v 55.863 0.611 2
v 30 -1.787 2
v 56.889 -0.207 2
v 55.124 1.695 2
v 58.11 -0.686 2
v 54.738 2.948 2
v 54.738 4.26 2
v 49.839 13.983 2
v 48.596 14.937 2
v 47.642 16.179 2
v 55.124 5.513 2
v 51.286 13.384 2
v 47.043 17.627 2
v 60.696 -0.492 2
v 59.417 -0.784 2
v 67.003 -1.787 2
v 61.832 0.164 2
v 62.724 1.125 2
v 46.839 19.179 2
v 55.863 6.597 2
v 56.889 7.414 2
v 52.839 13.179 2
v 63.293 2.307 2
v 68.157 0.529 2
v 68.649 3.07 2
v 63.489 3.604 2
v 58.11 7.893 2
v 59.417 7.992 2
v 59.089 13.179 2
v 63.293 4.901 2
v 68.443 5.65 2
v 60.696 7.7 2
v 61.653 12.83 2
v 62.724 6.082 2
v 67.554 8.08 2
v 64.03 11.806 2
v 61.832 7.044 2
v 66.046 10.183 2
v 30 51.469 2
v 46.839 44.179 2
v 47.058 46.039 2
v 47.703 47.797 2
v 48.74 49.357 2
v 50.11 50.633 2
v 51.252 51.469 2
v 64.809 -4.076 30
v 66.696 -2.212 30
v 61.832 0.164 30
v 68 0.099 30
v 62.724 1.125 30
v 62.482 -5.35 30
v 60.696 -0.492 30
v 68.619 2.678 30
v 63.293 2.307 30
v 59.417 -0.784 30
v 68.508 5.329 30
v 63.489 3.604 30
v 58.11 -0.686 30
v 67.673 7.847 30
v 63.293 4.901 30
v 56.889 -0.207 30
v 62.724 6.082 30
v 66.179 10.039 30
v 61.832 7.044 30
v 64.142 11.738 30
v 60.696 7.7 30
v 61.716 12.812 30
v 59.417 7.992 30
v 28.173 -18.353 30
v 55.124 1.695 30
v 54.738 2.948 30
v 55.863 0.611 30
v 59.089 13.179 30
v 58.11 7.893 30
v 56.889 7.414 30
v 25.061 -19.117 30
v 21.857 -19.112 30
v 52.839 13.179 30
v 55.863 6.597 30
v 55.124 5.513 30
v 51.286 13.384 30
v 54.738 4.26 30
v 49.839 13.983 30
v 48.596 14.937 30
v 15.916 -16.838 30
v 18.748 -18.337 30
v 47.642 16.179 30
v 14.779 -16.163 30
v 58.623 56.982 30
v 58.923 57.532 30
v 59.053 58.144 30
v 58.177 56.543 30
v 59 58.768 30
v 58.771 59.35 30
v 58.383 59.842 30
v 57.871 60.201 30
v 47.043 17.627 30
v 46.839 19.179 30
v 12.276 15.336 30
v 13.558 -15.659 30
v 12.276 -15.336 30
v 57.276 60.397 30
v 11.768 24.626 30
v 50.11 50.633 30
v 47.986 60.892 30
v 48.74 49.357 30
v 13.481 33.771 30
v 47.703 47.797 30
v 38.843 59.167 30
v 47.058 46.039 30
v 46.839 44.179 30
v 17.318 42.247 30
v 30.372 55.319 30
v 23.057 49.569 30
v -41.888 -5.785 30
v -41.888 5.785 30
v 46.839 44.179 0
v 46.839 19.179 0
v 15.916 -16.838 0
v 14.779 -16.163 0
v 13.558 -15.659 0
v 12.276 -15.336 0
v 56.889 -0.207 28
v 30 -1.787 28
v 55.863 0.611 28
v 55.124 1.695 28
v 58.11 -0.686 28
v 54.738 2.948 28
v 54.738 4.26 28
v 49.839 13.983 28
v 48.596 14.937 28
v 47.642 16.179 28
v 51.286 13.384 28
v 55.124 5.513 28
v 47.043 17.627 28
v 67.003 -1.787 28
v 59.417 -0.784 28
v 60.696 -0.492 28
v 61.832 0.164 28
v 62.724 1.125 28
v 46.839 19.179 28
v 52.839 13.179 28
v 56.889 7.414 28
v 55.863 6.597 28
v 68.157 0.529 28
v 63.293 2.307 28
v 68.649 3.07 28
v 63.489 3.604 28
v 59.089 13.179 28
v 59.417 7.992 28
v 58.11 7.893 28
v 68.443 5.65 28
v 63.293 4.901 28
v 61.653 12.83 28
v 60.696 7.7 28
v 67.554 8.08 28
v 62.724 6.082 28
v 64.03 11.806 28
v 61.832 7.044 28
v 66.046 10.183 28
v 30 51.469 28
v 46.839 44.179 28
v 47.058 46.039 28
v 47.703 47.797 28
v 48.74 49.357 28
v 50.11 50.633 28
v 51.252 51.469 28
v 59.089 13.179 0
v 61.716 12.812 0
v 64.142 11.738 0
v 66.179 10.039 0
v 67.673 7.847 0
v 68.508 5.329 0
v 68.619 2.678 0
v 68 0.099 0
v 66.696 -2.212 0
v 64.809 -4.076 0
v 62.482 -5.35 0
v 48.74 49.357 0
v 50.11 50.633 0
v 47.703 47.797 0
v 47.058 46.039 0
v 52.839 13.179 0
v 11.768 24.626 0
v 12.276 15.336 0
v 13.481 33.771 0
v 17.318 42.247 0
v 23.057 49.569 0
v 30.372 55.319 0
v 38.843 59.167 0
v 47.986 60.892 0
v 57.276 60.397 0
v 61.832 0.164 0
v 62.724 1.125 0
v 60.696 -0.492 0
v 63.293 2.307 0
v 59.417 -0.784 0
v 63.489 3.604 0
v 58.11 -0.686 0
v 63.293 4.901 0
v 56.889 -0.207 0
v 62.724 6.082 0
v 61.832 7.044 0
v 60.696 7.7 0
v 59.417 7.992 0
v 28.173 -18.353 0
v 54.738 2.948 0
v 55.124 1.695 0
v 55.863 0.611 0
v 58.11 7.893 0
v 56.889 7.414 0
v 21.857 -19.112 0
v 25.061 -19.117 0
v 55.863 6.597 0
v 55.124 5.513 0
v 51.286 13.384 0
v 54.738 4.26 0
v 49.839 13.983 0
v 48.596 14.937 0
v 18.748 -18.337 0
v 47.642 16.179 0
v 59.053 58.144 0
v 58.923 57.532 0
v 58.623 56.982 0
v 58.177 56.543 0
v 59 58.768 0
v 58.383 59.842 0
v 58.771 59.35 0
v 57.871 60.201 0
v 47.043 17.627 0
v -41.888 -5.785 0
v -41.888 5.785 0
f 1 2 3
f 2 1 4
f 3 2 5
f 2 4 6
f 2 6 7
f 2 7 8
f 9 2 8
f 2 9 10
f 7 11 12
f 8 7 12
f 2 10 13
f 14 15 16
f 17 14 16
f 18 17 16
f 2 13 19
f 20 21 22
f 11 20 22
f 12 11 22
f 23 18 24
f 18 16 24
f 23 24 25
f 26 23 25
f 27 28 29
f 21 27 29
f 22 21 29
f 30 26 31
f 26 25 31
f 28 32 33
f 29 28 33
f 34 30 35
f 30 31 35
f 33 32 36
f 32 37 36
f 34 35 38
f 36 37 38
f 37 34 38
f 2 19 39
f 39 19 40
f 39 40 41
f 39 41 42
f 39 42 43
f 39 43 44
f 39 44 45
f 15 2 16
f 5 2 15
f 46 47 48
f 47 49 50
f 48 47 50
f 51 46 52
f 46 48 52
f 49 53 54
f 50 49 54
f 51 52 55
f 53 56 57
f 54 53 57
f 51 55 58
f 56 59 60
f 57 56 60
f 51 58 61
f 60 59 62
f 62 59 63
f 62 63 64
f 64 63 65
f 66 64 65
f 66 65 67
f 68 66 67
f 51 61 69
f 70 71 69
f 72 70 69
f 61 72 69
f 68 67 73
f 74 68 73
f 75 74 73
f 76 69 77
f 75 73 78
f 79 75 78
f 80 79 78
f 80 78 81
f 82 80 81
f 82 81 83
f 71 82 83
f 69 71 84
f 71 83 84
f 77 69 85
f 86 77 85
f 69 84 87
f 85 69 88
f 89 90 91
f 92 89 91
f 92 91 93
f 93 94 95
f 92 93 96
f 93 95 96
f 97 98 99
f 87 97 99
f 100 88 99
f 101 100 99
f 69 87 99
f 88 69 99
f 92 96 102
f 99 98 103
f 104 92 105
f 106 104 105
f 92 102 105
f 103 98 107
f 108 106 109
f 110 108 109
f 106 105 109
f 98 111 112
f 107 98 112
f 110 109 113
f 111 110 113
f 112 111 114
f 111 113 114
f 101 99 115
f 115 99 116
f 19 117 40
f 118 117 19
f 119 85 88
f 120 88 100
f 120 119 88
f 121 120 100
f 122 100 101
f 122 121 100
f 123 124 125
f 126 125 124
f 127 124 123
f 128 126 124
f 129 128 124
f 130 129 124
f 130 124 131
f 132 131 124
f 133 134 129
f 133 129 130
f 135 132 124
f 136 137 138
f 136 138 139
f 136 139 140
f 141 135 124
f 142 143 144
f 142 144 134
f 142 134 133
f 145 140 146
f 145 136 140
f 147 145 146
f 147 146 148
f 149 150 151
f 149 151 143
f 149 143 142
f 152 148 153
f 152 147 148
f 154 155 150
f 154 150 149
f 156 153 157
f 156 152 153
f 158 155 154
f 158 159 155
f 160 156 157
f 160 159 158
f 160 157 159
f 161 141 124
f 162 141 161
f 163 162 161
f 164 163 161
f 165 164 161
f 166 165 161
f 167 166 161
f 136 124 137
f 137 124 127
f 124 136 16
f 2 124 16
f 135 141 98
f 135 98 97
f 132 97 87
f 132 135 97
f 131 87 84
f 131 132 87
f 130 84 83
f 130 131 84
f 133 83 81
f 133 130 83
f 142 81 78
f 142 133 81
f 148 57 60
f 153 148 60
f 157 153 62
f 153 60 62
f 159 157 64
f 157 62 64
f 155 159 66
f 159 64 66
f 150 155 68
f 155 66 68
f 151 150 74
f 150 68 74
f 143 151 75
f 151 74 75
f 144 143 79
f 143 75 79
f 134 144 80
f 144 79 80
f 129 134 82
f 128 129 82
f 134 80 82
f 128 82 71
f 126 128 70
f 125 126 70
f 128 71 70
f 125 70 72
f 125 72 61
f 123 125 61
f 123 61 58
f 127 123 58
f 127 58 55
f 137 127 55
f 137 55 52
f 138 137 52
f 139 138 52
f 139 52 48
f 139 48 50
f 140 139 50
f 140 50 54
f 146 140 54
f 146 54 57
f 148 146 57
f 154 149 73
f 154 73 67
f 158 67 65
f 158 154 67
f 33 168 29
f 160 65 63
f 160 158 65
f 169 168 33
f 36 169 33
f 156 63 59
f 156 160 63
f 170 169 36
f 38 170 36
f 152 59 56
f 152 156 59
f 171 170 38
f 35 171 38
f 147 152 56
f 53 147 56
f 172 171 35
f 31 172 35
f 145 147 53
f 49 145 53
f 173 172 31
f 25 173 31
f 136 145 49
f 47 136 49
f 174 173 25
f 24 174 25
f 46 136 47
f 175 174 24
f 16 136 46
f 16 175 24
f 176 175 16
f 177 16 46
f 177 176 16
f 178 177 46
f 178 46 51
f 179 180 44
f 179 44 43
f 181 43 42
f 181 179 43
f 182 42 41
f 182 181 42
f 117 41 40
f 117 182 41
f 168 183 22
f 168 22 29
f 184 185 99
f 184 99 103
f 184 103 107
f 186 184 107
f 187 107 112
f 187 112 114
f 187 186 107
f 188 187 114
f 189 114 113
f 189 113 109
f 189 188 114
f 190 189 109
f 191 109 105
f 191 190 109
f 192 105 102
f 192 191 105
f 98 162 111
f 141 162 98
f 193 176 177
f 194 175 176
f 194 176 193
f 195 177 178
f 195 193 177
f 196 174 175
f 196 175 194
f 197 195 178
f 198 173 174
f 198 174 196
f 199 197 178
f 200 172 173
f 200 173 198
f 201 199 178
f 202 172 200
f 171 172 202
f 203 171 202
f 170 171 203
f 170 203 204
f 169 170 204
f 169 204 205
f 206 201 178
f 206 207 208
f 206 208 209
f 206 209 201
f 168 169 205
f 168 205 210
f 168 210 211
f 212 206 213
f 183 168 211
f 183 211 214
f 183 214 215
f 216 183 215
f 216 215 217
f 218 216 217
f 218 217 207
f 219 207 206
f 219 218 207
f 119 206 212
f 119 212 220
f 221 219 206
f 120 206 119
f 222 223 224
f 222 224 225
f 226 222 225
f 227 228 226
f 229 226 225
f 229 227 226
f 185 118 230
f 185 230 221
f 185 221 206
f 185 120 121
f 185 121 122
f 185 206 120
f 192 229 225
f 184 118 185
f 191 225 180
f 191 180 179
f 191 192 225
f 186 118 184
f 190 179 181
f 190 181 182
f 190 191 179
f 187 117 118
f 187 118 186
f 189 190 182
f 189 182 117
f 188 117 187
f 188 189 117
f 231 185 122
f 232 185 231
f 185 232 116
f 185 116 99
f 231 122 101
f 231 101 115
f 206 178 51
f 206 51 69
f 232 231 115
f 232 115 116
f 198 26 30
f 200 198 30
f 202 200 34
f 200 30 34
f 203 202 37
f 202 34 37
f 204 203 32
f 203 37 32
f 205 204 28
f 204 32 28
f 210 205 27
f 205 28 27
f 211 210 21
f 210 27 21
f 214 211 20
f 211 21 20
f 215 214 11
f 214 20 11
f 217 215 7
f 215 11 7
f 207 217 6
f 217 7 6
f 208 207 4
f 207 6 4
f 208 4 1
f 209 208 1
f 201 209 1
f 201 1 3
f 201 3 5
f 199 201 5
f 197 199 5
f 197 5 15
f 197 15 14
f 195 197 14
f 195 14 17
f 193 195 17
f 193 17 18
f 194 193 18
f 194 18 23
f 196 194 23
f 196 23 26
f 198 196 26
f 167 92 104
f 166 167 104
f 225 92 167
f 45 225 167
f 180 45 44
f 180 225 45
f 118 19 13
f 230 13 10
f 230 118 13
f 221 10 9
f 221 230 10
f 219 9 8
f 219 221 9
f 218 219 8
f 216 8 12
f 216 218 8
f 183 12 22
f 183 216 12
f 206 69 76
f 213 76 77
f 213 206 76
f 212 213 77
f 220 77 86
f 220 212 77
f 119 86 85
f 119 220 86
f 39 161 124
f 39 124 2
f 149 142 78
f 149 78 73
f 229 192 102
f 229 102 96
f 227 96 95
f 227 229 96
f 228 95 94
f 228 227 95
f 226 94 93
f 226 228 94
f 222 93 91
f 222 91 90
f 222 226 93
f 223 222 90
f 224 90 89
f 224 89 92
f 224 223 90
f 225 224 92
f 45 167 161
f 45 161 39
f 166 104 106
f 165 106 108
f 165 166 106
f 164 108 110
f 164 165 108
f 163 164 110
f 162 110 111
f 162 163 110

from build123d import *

# Parameters (mm, degrees)
BOSS_EXTRUDE1_DEPTH = 30
SKETCH2_R           = 4.4
CUT_EXTRUDE1_DEPTH  = 97.608495293
SKETCH4_W           = 26
SKETCH4_H           = 53.255509589
CUT_EXTRUDE2_DEPTH  = 40


with BuildPart() as part:
    # Sketch1 → Boss-Extrude1 (new body)
    with BuildSketch(Plane.XY):
        with BuildLine():
            Line((-41.88810428, 5.785), (12.276322135, 15.335649772))
            ThreePointArc((12.276322135, 15.335649772), (23.057327156, 49.569411506), (57.276322135, 60.397194952))
            ThreePointArc((57.276322135, 60.397194952), (59.00041024, 58.767721176), (58.177057872, 56.542916587))
            Line((58.177057872, 56.542916587), (50.110478485, 50.632730719))
            ThreePointArc((50.110478485, 50.632730719), (47.703320965, 47.797119103), (46.838627179, 44.179467209))
            Line((46.838627179, 44.179467209), (46.838627179, 19.179467209))
            ThreePointArc((46.838627179, 19.179467209), (48.595986492, 14.936826522), (52.838627179, 13.179467209))
            Line((52.838627179, 13.179467209), (59.088627179, 13.179467209))
            ThreePointArc((59.088627179, 13.179467209), (68.507642402, 5.328734817), (62.482043199, -5.350403777))
            Line((62.482043199, -5.350403777), (28.173137316, -18.352594225))
            ThreePointArc((28.173137316, -18.352594225), (21.856973189, -19.111848957), (15.915778413, -16.837513523))
            ThreePointArc((15.915778413, -16.837513523), (14.177787103, -15.888509343), (12.276322135, -15.335649772))
            Line((12.276322135, -15.335649772), (-41.88810428, -5.785))
            Line((-41.88810428, -5.785), (-41.88810428, 5.785))
        make_face()
    extrude(amount=BOSS_EXTRUDE1_DEPTH)

    # Sketch2 → Cut-Extrude1 (cut, through all)
    with BuildSketch(Plane.XY.offset(30)):
        with Locations((59.088627179, 3.603809847)):
            Circle(SKETCH2_R)
    extrude(amount=-CUT_EXTRUDE1_DEPTH, mode=Mode.SUBTRACT)

    # Sketch4 → Cut-Extrude2 (cut)
    with BuildSketch(Plane(origin=(70, 0, 0), x_dir=(0, 0, -1), z_dir=(1, 0, 0))):
        with Locations((-15, 24.841006249)):
            Rectangle(SKETCH4_W, SKETCH4_H)
    extrude(amount=-CUT_EXTRUDE2_DEPTH, mode=Mode.SUBTRACT)


solid = part.part
